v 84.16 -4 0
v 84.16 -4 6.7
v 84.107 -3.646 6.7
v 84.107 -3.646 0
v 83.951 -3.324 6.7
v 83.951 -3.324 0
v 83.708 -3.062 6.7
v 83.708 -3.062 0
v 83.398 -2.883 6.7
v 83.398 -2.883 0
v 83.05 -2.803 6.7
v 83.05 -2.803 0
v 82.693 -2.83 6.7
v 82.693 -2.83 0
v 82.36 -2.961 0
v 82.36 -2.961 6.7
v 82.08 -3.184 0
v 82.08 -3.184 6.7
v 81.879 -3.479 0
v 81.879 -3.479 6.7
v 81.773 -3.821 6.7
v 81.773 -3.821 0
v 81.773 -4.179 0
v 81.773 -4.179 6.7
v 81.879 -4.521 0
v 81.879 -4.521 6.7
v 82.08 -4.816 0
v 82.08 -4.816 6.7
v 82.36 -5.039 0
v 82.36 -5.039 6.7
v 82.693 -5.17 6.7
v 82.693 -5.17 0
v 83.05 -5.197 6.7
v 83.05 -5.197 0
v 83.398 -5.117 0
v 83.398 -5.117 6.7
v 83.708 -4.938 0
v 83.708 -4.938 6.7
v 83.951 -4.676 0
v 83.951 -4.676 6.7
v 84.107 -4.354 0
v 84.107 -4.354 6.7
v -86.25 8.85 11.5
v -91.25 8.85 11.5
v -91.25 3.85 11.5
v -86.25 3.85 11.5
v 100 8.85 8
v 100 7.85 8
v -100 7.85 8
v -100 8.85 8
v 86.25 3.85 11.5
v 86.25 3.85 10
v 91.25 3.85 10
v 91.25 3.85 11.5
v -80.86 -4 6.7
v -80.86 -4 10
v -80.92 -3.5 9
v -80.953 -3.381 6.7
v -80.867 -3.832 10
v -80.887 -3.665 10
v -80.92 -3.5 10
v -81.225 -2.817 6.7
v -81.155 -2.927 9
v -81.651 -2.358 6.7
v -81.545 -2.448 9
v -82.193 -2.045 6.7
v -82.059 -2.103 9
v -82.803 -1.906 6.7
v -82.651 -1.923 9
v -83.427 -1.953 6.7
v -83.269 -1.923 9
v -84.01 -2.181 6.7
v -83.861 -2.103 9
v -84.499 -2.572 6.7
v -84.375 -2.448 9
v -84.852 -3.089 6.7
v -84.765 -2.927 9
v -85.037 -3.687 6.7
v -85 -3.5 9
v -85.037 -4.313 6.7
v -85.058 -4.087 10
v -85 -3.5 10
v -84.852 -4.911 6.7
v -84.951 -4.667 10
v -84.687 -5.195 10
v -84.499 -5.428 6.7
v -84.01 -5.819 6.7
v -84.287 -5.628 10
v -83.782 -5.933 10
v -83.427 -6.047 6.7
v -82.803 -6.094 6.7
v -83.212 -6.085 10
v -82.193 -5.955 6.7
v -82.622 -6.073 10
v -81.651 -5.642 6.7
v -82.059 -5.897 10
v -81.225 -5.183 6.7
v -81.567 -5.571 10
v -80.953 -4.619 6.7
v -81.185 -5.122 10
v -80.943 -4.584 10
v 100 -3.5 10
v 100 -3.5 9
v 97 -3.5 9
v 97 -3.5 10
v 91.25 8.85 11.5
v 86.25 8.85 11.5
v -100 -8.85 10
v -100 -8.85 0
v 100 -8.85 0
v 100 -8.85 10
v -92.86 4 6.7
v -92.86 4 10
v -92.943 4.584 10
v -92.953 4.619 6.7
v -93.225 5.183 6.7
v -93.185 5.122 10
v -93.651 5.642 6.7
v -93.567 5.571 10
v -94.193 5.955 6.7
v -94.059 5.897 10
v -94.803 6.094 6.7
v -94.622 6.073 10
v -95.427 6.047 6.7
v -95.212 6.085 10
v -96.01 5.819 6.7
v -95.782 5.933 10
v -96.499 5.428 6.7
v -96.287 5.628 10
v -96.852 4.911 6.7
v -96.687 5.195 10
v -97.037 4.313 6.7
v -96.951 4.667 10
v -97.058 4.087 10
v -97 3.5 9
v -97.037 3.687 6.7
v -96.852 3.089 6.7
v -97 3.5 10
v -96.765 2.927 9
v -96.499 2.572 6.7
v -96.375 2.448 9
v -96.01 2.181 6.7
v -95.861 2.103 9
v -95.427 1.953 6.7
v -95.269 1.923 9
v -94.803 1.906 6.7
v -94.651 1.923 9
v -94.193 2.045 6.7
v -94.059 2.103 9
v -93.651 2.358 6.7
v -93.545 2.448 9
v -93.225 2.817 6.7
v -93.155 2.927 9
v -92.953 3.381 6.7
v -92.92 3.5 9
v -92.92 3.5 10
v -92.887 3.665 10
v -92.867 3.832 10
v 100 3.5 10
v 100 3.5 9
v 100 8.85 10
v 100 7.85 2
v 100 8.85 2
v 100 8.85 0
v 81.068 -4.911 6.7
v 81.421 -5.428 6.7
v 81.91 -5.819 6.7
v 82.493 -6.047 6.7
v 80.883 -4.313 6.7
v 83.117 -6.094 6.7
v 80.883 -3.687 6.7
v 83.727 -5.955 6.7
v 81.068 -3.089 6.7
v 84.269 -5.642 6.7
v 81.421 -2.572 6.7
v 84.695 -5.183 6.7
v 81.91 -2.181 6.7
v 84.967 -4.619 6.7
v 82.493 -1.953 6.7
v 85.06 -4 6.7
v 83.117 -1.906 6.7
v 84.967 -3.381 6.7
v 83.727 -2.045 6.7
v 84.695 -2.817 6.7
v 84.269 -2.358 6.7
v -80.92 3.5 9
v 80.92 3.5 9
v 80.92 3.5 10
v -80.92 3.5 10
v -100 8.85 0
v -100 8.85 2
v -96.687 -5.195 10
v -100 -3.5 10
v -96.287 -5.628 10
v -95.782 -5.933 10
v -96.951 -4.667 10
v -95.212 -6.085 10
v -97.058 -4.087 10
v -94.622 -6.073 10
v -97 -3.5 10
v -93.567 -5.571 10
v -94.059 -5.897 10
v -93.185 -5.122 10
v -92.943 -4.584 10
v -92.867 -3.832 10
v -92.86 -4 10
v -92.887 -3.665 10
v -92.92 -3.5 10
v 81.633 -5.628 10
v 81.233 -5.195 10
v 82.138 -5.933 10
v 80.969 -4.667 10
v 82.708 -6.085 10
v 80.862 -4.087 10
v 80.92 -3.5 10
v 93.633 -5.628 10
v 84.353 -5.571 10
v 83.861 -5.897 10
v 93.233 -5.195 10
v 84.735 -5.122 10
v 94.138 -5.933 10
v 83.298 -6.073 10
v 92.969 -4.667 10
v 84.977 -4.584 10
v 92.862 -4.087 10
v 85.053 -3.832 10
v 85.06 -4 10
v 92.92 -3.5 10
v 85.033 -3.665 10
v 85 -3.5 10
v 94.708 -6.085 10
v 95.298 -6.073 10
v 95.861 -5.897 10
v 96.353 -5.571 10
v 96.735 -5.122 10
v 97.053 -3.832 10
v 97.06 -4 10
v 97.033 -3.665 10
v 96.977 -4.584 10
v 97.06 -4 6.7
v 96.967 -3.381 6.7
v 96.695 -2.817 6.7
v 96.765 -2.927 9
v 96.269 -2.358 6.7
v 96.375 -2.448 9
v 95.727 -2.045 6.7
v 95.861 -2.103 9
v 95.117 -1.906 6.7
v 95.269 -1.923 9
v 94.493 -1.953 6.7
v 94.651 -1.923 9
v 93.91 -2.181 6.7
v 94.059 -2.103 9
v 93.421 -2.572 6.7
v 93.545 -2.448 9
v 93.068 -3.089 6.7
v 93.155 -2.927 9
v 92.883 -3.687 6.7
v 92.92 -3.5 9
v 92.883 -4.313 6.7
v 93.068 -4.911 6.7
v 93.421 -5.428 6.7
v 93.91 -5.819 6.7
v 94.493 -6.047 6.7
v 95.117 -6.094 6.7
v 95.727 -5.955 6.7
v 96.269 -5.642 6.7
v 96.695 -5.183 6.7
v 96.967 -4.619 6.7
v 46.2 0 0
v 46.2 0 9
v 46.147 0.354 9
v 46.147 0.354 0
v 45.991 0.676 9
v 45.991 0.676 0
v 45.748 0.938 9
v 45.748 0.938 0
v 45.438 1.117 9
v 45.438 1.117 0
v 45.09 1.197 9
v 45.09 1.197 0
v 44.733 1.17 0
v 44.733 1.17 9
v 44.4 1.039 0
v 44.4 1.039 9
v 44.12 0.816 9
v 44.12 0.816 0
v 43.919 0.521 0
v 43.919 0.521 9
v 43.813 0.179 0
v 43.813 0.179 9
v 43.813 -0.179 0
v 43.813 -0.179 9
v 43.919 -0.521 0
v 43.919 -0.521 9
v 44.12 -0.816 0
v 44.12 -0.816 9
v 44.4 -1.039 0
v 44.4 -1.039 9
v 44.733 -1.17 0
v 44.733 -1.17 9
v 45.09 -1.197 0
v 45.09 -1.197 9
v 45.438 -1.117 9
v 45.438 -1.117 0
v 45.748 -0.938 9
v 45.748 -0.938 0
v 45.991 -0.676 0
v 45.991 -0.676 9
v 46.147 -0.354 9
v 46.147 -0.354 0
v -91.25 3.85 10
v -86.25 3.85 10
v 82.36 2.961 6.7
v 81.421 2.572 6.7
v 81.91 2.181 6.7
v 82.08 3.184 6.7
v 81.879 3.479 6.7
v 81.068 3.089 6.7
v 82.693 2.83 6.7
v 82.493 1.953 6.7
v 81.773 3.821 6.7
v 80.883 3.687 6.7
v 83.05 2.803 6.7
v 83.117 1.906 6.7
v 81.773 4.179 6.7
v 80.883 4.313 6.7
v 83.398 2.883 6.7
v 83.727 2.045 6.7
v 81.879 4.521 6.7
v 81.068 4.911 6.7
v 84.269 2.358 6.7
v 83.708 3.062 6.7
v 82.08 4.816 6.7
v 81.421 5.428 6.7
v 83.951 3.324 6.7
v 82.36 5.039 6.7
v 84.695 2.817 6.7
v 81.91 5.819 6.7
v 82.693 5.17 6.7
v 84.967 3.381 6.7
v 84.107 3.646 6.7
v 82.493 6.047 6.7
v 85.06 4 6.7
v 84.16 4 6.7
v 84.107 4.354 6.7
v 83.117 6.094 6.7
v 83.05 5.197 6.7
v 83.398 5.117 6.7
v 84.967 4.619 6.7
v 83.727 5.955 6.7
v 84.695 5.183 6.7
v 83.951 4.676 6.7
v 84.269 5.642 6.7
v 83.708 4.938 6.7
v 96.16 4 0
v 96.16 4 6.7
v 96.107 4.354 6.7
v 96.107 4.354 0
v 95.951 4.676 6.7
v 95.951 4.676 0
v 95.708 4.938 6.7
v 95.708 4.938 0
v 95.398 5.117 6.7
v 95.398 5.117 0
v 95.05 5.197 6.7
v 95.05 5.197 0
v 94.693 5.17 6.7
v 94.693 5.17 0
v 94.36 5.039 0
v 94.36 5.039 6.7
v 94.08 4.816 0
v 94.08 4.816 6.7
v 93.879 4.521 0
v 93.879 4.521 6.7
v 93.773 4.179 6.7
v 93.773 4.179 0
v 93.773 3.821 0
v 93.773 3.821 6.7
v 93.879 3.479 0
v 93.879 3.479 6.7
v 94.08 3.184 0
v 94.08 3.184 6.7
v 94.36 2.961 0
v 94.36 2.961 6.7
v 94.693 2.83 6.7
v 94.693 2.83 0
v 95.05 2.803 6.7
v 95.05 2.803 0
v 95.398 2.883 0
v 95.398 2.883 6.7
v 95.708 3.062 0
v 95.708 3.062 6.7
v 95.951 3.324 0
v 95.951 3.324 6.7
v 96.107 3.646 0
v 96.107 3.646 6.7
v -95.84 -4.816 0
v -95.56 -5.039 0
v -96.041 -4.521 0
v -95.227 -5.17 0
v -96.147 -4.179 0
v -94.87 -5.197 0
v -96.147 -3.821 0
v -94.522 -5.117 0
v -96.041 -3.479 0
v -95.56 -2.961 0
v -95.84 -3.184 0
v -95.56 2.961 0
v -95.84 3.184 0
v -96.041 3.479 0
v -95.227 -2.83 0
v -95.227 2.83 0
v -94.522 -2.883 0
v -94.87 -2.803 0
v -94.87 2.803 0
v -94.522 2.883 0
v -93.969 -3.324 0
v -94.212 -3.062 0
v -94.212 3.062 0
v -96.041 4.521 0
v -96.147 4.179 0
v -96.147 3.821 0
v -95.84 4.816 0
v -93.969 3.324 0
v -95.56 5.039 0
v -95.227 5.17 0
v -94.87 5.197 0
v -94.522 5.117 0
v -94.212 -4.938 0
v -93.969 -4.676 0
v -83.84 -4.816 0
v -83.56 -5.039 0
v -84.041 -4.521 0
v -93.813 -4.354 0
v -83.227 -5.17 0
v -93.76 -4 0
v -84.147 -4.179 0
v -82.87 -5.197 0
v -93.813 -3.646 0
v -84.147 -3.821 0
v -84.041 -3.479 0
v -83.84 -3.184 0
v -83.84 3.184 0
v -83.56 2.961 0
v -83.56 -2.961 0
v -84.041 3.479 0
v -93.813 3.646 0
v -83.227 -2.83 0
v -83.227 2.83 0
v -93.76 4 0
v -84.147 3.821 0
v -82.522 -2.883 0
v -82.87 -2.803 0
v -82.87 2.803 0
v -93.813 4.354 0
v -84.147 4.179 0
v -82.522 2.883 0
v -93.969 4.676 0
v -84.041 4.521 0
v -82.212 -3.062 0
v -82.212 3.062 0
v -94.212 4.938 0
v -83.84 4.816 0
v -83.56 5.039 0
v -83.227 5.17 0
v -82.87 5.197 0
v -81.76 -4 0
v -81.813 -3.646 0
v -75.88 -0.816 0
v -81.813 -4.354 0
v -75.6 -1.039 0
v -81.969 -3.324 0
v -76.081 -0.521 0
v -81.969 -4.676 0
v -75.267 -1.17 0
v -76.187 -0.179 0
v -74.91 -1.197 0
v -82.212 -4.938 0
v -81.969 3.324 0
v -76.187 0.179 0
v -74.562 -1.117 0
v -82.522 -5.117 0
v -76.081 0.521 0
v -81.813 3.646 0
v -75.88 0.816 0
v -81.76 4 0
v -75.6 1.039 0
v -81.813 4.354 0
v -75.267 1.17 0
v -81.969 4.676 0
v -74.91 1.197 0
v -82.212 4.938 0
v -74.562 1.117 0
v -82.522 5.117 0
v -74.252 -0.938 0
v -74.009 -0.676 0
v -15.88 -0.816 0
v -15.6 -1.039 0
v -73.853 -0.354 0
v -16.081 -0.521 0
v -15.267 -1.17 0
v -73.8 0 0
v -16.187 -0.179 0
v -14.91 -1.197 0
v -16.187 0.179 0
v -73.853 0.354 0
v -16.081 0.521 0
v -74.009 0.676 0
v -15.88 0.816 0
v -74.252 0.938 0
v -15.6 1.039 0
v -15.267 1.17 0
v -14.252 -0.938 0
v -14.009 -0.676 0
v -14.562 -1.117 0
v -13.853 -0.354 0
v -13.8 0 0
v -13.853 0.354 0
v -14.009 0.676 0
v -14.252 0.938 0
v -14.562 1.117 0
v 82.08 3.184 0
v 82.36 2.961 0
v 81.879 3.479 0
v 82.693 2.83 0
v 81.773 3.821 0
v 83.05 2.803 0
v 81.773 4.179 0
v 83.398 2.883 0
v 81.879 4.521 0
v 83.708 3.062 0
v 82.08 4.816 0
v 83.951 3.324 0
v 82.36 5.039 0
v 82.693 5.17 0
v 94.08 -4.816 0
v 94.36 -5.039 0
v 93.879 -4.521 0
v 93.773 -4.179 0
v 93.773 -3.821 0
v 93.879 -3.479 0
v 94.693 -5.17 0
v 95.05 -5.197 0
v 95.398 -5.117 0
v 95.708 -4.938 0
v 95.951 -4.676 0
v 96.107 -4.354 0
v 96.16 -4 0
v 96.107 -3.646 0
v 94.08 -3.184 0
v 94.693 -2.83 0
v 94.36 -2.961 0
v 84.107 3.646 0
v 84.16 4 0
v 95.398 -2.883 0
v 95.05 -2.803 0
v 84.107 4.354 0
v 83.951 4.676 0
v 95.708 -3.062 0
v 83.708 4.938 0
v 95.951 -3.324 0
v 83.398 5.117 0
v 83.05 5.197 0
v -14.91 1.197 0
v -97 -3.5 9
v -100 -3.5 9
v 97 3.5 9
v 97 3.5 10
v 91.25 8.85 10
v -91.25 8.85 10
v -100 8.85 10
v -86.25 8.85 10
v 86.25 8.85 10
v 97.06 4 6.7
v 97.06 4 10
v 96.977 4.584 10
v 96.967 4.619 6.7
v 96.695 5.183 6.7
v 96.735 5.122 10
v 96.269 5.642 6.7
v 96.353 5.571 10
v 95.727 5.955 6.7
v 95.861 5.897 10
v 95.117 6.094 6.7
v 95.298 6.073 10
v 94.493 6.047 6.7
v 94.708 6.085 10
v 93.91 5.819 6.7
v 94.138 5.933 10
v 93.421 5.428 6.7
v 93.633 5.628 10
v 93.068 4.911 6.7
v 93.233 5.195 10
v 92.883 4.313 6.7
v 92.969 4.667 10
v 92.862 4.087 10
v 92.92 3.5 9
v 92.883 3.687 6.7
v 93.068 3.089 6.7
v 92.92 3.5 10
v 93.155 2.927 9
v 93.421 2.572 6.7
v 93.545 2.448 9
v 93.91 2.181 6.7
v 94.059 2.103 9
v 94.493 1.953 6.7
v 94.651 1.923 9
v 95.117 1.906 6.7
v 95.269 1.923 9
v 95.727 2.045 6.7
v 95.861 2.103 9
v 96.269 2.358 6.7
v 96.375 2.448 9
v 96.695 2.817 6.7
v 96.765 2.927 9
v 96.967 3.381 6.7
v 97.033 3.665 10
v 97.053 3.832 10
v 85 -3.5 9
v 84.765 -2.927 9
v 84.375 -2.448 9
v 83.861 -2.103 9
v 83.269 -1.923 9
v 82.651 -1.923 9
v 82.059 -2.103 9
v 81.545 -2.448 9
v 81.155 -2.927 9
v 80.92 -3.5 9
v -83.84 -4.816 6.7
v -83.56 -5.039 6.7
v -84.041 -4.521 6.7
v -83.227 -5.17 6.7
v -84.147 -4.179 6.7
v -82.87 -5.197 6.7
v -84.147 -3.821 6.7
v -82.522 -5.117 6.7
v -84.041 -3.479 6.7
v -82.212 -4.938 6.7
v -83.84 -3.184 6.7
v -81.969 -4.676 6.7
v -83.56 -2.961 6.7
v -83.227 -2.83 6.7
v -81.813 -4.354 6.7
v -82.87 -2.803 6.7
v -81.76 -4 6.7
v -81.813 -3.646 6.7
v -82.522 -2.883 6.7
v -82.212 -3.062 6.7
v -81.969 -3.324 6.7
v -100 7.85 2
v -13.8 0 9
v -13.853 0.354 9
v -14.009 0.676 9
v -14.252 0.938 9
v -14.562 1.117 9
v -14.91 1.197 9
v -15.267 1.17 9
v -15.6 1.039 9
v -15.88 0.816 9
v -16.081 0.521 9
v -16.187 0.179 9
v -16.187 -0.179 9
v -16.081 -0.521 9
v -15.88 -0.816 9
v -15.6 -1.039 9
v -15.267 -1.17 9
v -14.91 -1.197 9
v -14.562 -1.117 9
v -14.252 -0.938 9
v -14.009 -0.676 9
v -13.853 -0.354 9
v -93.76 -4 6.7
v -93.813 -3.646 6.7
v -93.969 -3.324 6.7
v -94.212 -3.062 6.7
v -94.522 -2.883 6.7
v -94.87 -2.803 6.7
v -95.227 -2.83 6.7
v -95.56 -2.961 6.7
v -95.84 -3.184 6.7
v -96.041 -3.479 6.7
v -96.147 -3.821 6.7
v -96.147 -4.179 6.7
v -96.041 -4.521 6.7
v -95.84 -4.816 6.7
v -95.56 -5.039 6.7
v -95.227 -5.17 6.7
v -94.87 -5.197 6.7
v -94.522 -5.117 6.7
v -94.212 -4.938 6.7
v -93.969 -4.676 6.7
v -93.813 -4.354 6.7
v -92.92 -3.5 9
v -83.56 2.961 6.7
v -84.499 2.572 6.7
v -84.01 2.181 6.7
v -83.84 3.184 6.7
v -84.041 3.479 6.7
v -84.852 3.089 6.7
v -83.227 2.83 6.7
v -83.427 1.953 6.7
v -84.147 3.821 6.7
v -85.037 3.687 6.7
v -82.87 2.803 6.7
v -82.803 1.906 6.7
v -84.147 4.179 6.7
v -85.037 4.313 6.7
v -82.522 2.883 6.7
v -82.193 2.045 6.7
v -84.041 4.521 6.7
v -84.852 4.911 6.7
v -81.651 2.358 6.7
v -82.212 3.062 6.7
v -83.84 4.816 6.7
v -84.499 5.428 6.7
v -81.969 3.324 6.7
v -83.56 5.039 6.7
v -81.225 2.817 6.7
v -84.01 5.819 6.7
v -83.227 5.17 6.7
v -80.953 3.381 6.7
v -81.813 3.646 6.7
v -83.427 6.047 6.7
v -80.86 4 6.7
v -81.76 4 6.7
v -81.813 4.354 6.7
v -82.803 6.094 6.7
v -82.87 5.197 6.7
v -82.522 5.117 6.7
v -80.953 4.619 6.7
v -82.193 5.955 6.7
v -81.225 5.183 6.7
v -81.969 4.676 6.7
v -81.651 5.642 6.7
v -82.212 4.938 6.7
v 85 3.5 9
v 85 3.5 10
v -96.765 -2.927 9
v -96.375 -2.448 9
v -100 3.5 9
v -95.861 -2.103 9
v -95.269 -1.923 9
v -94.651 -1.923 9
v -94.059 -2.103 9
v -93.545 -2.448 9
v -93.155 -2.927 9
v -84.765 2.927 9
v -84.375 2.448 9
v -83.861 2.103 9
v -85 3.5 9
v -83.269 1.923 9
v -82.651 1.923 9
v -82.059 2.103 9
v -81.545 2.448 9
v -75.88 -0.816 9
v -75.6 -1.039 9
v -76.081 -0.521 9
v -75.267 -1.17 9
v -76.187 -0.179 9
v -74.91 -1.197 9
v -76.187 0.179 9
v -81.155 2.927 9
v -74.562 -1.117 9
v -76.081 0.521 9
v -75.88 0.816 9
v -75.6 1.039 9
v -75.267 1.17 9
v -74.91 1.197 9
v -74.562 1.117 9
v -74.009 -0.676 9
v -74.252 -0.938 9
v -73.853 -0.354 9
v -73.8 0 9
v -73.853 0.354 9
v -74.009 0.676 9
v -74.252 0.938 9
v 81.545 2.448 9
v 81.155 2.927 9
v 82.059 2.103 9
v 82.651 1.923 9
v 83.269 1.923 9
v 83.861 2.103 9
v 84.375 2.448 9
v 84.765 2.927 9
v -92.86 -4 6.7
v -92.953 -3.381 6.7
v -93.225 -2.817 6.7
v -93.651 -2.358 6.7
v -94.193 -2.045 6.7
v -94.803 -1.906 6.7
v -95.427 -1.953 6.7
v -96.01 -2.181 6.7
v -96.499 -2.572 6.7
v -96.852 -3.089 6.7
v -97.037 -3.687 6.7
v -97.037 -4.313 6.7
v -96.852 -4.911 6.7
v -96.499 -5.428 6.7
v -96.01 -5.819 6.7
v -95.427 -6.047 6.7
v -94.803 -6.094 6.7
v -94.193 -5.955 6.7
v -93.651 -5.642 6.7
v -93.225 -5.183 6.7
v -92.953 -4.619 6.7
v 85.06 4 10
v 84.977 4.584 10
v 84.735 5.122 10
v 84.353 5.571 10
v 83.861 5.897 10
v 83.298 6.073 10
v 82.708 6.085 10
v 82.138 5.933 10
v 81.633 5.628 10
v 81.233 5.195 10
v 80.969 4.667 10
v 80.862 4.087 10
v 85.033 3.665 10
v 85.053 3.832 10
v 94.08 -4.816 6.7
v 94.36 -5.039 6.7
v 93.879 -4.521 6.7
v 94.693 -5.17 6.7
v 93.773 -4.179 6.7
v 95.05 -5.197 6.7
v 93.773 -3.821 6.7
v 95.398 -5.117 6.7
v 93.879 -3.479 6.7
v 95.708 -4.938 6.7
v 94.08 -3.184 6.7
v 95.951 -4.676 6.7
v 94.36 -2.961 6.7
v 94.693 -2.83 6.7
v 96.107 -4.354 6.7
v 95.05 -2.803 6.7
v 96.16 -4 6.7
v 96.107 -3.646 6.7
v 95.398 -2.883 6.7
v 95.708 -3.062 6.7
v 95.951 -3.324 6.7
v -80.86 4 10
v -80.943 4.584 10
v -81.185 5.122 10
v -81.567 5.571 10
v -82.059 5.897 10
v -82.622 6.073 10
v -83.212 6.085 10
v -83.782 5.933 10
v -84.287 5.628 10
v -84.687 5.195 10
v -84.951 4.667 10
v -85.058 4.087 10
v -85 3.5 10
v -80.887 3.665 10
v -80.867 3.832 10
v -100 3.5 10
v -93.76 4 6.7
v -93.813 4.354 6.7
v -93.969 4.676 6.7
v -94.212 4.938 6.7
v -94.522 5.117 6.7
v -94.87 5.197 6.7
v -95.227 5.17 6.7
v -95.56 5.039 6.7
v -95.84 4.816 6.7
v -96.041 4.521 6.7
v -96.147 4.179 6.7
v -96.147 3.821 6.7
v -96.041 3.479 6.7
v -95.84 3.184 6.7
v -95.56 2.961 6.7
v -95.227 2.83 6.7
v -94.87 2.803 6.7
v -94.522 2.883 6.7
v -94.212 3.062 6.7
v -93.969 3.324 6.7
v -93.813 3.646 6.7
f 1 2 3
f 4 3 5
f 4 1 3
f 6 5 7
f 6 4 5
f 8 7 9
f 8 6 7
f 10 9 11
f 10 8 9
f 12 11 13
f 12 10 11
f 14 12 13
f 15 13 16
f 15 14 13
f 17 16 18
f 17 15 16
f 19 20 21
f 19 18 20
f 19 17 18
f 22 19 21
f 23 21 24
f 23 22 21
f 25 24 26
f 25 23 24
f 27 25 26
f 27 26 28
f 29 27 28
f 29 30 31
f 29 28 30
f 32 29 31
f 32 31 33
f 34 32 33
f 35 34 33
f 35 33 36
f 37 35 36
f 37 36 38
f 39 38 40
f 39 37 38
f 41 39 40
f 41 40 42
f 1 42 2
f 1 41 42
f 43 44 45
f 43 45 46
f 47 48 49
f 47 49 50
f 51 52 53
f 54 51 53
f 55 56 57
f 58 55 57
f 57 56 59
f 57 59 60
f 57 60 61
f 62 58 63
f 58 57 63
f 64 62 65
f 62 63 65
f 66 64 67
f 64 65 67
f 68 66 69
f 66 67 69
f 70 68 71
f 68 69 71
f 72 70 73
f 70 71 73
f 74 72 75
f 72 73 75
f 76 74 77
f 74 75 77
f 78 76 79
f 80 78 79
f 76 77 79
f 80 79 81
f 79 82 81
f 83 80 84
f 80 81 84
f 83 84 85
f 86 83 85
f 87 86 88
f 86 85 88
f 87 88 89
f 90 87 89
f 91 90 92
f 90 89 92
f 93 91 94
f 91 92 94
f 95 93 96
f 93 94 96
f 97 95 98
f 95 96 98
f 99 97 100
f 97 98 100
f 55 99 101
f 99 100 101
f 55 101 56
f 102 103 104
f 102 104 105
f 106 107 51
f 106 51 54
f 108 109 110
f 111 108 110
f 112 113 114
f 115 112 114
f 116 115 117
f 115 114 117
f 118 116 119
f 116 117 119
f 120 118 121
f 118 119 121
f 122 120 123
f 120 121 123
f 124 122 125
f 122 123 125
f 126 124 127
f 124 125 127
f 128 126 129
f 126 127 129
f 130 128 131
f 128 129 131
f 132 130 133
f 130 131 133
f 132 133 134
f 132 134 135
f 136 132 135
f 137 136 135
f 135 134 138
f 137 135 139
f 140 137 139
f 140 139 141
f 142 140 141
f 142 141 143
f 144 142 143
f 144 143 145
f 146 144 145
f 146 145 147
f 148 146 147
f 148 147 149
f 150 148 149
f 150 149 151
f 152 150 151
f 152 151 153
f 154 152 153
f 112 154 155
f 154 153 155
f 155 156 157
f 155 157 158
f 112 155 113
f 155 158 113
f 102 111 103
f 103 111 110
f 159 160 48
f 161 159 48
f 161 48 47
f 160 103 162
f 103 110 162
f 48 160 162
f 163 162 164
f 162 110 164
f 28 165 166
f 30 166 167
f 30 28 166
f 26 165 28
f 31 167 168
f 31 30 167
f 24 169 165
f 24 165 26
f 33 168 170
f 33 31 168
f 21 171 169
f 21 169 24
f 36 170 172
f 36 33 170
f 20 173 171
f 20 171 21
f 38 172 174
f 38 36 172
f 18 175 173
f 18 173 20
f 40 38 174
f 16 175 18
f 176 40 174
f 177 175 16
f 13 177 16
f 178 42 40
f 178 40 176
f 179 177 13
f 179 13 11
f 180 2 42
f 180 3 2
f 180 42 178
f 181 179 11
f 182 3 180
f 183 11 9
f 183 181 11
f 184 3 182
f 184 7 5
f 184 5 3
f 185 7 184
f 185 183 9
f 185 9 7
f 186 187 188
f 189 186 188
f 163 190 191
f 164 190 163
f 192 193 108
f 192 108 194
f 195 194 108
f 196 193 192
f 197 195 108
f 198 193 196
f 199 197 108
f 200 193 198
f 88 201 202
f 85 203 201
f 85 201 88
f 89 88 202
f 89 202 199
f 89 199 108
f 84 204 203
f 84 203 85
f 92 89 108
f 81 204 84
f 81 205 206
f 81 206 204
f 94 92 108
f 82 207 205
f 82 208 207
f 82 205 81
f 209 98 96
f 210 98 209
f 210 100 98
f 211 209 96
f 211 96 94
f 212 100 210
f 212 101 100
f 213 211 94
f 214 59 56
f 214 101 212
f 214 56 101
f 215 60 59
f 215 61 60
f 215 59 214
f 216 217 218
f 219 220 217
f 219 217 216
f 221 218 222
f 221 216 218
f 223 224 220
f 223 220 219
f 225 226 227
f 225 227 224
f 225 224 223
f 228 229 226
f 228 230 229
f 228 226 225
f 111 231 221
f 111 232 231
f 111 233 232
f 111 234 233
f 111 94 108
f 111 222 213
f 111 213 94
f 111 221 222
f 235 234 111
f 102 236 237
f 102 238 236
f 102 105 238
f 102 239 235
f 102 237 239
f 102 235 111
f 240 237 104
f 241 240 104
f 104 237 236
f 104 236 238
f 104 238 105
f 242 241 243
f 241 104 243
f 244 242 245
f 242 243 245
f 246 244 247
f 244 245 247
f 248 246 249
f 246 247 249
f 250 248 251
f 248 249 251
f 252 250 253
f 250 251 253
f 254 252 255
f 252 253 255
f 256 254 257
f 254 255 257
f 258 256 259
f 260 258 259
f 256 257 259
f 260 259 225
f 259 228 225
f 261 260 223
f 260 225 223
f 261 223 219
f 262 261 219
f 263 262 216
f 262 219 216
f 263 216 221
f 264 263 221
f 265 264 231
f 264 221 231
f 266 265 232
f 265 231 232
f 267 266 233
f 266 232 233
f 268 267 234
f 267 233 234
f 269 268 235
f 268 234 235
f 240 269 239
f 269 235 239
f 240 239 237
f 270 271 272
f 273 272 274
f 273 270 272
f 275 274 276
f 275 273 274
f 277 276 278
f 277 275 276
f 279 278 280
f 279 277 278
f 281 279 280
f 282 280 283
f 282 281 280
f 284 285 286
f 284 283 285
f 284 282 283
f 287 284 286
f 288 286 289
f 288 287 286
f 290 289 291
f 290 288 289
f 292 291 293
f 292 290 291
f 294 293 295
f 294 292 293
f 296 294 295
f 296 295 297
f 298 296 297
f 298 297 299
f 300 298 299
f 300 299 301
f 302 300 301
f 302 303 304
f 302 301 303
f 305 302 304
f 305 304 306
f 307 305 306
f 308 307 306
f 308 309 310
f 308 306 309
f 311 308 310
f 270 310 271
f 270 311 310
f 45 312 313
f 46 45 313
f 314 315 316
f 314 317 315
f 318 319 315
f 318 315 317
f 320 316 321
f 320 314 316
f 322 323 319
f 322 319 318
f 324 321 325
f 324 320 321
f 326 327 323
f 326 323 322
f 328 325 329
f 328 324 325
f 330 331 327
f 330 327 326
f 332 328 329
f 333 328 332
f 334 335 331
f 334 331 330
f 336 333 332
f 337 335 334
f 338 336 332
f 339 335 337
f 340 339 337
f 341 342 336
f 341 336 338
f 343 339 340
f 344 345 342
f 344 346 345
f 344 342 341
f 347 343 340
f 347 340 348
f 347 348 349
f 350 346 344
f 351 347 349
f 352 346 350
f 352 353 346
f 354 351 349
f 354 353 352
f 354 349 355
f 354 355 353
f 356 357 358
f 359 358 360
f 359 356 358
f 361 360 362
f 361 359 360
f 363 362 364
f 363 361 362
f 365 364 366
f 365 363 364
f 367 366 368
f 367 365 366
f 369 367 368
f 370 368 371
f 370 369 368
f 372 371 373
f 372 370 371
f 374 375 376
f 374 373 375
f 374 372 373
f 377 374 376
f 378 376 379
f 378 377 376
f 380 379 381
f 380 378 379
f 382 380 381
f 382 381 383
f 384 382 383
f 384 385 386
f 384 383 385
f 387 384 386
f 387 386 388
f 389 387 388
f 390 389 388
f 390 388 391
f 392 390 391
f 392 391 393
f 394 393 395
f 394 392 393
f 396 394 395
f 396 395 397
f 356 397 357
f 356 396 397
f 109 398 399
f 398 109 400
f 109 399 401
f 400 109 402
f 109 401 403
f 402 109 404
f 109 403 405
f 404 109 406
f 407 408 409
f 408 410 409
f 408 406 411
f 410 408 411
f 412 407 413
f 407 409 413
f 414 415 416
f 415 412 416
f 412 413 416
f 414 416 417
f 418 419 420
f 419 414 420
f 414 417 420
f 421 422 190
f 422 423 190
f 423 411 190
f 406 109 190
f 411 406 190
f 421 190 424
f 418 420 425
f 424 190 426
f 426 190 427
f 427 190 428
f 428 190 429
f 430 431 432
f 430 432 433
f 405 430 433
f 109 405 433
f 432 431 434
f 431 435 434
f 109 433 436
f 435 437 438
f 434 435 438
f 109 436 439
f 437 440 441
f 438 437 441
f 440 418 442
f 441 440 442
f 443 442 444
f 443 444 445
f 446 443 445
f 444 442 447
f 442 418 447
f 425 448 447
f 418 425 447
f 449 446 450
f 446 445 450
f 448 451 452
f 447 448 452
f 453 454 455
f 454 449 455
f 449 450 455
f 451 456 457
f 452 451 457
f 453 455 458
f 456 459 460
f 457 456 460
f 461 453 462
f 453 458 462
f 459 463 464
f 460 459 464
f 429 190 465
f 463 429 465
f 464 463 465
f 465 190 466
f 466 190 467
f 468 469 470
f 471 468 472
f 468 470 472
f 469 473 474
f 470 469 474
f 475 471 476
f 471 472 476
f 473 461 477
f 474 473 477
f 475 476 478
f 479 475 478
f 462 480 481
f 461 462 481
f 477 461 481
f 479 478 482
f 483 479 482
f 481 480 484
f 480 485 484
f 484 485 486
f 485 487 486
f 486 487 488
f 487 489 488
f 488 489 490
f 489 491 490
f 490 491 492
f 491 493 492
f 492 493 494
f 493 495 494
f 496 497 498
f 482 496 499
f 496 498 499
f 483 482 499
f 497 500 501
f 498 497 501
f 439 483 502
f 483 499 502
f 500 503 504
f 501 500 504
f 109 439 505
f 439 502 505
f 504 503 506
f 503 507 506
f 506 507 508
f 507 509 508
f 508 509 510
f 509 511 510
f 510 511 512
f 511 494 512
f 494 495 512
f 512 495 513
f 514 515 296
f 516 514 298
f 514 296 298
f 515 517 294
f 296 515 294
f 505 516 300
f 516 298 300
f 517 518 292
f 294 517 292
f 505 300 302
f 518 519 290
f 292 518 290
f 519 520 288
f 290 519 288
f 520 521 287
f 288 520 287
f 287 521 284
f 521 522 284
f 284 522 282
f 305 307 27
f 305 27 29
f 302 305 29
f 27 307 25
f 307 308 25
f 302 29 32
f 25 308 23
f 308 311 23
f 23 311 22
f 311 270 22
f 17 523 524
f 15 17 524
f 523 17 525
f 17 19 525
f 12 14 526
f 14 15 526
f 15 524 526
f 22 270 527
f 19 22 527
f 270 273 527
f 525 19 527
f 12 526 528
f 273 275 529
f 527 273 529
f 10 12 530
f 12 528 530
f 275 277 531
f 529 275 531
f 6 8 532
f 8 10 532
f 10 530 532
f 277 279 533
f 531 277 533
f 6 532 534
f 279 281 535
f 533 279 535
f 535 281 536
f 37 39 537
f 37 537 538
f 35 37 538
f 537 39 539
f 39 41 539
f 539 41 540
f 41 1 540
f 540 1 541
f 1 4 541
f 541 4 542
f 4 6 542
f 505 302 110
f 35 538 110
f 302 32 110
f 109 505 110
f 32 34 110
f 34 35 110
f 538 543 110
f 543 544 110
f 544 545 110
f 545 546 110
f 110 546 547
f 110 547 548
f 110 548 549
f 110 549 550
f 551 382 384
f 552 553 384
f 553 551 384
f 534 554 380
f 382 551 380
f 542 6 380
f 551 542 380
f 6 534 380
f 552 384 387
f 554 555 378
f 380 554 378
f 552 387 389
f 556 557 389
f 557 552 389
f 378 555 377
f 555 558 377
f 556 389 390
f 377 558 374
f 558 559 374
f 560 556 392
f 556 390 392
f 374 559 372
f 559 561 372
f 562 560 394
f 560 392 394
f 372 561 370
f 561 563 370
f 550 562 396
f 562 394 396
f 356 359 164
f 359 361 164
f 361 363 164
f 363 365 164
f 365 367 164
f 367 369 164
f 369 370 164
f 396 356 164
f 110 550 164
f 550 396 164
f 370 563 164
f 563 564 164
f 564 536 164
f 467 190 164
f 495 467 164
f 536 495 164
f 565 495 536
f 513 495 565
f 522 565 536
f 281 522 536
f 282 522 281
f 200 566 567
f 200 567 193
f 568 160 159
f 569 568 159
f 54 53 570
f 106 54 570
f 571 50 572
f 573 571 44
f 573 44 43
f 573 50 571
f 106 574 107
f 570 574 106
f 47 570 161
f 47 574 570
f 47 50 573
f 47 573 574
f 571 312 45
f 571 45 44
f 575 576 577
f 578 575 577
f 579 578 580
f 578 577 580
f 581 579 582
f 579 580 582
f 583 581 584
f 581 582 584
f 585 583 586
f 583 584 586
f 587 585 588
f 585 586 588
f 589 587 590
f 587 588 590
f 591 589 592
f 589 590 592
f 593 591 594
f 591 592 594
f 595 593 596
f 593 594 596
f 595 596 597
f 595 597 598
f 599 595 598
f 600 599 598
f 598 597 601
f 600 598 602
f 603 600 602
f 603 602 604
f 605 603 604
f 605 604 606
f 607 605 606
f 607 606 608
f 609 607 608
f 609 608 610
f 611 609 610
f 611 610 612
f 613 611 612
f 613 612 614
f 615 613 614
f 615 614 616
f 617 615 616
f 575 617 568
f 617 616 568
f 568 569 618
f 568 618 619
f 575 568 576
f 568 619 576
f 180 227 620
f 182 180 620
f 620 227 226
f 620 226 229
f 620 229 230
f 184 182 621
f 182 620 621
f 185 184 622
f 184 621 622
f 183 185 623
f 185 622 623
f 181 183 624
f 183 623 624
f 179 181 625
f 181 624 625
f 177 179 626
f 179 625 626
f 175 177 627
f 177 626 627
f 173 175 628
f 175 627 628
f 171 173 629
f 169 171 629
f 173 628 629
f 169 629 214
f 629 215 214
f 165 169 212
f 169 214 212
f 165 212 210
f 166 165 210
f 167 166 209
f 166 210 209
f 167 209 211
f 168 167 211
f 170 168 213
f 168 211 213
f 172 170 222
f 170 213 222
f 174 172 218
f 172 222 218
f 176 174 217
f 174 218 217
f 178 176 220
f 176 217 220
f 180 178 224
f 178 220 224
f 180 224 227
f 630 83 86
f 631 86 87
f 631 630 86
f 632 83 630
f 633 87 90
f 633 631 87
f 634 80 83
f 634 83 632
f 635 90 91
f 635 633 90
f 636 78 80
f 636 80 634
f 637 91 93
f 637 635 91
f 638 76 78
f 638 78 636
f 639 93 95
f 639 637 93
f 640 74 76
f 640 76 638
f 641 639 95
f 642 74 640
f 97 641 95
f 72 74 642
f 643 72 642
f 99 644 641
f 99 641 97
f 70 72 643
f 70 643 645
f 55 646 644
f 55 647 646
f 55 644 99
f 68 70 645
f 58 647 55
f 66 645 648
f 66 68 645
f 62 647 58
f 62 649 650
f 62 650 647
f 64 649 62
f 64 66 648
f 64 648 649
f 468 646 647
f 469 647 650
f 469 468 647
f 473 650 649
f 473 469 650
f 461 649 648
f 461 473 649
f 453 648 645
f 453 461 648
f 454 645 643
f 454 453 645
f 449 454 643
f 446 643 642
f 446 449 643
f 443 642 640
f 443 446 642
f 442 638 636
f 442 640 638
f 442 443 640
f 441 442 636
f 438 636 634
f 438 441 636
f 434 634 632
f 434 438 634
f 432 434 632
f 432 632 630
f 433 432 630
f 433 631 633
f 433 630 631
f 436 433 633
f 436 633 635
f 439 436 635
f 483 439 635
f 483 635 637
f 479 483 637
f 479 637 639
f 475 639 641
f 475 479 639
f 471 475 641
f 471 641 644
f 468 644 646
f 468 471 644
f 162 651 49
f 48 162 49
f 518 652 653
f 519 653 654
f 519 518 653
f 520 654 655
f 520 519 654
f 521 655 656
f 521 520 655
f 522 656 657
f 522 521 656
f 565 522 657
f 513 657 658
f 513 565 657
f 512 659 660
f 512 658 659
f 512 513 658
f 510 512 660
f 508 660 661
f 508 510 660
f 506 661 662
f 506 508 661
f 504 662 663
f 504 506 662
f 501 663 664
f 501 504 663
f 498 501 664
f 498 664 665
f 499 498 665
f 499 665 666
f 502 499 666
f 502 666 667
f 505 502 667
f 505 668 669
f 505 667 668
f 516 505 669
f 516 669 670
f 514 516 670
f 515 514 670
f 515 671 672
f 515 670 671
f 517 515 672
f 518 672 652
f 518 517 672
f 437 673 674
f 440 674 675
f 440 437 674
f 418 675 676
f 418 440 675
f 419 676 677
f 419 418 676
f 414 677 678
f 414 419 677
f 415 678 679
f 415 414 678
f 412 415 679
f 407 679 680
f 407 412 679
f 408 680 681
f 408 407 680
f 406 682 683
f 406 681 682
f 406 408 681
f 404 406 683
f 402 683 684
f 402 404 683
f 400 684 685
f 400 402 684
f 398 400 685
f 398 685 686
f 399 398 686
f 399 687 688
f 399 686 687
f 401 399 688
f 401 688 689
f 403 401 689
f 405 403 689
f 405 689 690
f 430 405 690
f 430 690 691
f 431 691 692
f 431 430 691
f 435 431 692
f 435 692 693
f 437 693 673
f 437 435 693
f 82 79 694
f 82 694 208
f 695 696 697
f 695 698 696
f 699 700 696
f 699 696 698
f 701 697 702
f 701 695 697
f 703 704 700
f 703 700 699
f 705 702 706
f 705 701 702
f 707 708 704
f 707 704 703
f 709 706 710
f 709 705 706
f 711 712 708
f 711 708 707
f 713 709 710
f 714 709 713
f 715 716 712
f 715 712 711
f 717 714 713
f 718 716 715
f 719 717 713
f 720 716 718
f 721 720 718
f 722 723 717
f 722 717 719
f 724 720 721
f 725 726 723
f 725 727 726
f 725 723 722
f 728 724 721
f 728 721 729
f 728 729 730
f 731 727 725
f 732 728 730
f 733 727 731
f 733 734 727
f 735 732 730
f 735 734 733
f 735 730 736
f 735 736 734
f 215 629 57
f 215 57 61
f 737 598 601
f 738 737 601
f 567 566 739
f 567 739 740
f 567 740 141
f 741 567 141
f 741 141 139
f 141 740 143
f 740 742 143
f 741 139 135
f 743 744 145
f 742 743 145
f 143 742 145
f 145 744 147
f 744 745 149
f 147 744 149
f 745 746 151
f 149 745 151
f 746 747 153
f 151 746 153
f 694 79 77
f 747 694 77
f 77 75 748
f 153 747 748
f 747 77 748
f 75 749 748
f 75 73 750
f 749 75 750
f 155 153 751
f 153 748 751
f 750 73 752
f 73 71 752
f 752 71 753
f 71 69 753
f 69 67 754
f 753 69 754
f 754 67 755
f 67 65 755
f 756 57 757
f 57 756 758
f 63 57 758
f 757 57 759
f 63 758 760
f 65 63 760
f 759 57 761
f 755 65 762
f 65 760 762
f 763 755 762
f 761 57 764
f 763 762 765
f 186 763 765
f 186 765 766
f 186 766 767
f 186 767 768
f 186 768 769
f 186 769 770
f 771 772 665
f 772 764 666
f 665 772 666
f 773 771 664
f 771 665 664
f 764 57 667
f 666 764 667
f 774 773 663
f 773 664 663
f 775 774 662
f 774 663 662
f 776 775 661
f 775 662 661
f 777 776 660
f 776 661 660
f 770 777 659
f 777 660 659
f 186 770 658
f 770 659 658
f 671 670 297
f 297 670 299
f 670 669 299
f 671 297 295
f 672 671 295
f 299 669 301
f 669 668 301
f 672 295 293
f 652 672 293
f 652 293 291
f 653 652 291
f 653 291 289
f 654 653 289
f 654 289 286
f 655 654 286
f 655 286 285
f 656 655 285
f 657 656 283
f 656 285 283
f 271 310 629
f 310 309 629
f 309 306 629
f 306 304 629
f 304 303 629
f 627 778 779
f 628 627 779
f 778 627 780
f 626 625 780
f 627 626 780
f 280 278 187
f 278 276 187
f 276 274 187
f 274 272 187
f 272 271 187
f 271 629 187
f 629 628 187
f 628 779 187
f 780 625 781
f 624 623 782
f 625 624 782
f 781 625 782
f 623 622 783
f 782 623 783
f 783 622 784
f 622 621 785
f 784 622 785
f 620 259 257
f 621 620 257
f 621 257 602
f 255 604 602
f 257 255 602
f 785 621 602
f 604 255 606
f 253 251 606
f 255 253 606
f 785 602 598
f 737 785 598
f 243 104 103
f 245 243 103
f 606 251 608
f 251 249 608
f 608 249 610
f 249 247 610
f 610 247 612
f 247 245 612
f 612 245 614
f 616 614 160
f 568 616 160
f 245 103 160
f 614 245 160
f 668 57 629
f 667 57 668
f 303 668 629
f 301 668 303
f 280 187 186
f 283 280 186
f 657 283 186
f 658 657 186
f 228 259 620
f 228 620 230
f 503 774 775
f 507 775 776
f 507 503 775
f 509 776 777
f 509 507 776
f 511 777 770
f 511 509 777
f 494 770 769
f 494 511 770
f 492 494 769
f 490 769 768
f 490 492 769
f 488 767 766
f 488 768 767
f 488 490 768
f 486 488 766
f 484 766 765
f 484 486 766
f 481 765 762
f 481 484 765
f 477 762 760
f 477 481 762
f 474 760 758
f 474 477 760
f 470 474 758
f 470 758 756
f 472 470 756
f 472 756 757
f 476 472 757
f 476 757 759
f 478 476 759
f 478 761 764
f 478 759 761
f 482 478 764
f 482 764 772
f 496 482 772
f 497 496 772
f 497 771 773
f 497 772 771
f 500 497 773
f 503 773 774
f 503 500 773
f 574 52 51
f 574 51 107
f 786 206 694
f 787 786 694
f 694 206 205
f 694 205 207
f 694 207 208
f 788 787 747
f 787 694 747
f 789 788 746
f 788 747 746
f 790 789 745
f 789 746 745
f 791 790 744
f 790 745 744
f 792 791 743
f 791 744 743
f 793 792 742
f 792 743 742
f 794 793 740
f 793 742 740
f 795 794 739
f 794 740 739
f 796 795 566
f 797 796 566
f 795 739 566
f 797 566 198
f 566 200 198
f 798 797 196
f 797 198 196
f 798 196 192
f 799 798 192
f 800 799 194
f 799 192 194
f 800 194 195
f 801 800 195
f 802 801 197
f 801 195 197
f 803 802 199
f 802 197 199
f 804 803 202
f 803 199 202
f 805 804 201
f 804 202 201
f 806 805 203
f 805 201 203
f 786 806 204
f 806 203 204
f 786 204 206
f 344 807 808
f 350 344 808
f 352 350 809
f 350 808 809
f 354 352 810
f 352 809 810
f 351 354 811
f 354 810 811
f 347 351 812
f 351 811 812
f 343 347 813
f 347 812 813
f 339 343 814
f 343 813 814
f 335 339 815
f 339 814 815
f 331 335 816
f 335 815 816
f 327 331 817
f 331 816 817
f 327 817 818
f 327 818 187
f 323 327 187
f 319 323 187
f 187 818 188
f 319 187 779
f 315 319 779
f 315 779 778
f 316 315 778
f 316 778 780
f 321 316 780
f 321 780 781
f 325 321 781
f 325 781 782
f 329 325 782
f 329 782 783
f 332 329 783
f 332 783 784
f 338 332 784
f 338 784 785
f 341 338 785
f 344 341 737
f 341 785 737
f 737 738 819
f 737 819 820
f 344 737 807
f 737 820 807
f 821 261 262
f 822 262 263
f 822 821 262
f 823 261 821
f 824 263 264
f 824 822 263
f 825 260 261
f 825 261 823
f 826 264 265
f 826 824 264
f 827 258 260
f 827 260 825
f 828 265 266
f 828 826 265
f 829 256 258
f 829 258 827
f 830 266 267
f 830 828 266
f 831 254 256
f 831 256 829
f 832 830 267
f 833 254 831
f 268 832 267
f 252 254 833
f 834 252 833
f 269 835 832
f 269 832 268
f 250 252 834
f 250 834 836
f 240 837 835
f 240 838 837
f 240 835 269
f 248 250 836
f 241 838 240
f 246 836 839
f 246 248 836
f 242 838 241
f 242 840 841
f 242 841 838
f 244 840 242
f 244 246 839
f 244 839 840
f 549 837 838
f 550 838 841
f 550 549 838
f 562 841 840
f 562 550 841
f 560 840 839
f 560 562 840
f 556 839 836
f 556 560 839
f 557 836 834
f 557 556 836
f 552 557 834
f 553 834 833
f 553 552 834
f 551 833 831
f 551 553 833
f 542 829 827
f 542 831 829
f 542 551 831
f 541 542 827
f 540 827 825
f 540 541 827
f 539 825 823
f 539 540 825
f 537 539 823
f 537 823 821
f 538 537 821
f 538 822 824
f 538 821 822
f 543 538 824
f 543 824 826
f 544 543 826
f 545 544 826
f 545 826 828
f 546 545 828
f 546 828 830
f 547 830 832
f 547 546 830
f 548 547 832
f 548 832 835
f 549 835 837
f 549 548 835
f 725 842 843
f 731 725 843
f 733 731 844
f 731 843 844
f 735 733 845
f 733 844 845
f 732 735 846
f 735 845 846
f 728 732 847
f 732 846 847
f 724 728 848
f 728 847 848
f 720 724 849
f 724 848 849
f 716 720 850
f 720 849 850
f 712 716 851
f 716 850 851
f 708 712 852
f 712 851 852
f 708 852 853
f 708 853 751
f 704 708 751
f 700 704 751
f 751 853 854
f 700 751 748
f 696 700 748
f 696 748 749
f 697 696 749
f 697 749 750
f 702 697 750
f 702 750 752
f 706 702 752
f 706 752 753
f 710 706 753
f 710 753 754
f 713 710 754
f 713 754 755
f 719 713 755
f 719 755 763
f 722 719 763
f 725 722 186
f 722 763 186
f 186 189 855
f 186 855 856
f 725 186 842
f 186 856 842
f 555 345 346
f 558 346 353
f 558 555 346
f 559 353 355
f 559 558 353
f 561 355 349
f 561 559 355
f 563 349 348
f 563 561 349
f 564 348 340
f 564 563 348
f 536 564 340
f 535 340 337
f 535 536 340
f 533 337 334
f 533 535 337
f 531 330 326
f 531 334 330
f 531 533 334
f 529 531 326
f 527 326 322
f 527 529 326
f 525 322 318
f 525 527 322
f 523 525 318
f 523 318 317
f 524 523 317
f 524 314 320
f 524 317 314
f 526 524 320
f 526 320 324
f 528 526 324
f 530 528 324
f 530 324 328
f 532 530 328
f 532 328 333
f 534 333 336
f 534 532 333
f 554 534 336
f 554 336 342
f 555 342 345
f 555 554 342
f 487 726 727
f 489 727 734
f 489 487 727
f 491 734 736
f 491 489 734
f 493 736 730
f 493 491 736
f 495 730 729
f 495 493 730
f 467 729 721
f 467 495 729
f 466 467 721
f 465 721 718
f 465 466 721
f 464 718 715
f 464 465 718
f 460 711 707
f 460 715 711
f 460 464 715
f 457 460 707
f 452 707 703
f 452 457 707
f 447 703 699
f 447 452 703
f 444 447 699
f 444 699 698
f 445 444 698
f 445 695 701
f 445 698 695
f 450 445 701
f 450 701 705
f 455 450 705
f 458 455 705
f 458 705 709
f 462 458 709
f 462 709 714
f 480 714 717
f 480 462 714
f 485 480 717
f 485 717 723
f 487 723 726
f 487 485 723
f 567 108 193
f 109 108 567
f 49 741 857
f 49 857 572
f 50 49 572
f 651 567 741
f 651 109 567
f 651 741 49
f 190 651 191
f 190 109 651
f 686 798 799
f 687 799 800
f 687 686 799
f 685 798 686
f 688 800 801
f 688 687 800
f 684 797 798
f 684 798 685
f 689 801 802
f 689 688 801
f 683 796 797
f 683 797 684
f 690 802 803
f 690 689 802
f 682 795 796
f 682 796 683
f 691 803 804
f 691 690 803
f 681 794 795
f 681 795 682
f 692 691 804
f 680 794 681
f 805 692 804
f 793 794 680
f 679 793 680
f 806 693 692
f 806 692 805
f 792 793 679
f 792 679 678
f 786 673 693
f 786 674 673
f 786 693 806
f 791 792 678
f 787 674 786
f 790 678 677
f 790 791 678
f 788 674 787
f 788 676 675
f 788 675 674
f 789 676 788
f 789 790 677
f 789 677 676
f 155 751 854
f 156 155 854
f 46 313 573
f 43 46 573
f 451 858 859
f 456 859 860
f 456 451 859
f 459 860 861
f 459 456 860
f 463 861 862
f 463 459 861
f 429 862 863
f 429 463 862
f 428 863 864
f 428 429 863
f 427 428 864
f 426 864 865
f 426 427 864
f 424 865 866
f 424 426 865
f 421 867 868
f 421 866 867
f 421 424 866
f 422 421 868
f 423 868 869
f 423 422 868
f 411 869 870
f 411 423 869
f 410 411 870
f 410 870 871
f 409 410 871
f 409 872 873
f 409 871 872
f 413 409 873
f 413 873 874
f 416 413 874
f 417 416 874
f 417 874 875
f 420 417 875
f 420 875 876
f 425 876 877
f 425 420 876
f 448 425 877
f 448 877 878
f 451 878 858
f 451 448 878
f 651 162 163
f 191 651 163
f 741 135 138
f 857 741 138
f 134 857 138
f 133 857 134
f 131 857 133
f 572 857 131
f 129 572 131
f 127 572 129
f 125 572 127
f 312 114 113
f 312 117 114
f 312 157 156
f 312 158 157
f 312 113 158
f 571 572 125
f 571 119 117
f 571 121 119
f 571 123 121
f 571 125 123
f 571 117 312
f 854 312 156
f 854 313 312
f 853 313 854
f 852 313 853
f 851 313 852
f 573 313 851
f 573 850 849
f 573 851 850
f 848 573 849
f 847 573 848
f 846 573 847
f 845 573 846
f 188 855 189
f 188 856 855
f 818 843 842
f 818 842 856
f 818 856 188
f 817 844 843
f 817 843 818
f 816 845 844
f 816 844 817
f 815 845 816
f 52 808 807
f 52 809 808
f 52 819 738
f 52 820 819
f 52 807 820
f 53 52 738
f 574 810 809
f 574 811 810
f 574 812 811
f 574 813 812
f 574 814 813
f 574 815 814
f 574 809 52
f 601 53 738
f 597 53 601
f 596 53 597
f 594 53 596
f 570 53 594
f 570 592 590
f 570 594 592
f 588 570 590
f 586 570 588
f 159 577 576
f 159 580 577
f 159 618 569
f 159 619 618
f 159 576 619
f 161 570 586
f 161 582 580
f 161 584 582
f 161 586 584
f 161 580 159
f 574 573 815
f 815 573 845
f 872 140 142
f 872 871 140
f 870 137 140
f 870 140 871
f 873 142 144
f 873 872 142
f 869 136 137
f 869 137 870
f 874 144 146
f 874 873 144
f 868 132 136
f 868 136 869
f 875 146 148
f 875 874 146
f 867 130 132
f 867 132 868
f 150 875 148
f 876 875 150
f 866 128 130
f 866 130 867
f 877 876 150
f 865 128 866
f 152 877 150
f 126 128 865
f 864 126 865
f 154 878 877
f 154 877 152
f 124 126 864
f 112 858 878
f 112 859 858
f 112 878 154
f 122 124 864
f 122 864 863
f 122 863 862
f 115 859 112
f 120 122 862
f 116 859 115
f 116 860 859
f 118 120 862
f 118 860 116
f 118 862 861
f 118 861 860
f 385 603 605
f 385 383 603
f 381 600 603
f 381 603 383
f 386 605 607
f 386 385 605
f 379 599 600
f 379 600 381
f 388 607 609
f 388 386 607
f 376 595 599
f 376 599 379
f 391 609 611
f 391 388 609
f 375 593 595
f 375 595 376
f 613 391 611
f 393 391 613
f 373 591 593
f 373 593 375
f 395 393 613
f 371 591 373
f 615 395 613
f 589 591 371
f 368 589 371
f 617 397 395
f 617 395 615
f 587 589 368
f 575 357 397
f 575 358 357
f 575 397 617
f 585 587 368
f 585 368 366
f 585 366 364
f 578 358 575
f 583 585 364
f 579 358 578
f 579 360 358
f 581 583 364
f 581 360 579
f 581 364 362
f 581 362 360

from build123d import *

# Parameters (mm, degrees)
SKETCH_W        = 200
SKETCH_H        = 17.7
SKETCH_R        = 1.2
PAD_DEPTH       = 10
SKETCH001_R     = 2.1
POCKET_DEPTH    = 3.3
SKETCH002_W     = 7
SKETCH002_H     = 1
POCKET001_DEPTH = 200
SKETCH012_W     = 5
SKETCH012_H     = 5
PAD003_DEPTH    = 1.5
SKETCH013_W     = 1
SKETCH013_H     = 6
POCKET009_DEPTH = 200


with BuildPart() as part:
    # Sketch → Pad (new body)
    with BuildSketch(Plane.XY):
        Rectangle(SKETCH_W, SKETCH_H)
        with Locations((-75, 0)):
            Circle(SKETCH_R, mode=Mode.SUBTRACT)
        with Locations((-15, 0)):
            Circle(SKETCH_R, mode=Mode.SUBTRACT)
        with Locations((45, 0)):
            Circle(SKETCH_R, mode=Mode.SUBTRACT)
        with Locations((-94.96, 4)):
            Circle(SKETCH_R, mode=Mode.SUBTRACT)
        with Locations((-82.96, 4)):
            Circle(SKETCH_R, mode=Mode.SUBTRACT)
        with Locations((-94.96, -4)):
            Circle(SKETCH_R, mode=Mode.SUBTRACT)
        with Locations((-82.96, -4)):
            Circle(SKETCH_R, mode=Mode.SUBTRACT)
        with Locations((82.96, 4)):
            Circle(SKETCH_R, mode=Mode.SUBTRACT)
        with Locations((94.96, 4)):
            Circle(SKETCH_R, mode=Mode.SUBTRACT)
        with Locations((82.96, -4)):
            Circle(SKETCH_R, mode=Mode.SUBTRACT)
        with Locations((94.96, -4)):
            Circle(SKETCH_R, mode=Mode.SUBTRACT)
    extrude(amount=PAD_DEPTH)

    # Sketch001 (on Face17 of Pad) → Pocket (cut)
    with BuildSketch(Plane.XY.offset(10)):
        with Locations((94.96, -4)):
            Circle(SKETCH001_R)
        with Locations((-94.96, 4)):
            Circle(SKETCH001_R)
        with Locations((-82.96, 4)):
            Circle(SKETCH001_R)
        with Locations((-82.96, -4)):
            Circle(SKETCH001_R)
        with Locations((94.96, 4)):
            Circle(SKETCH001_R)
        with Locations((82.96, 4)):
            Circle(SKETCH001_R)
        with Locations((-94.96, -4)):
            Circle(SKETCH001_R)
        with Locations((82.96, -4)):
            Circle(SKETCH001_R)
    extrude(amount=-POCKET_DEPTH, mode=Mode.SUBTRACT)

    # Sketch002 (on Face3 of Pocket) → Pocket001 (cut)
    with BuildSketch(Plane.YZ.offset(100)):
        with Locations((0, 9.5)):
            Rectangle(SKETCH002_W, SKETCH002_H)
    extrude(amount=-POCKET001_DEPTH, mode=Mode.SUBTRACT)

    # Sketch012 (on Face9 of Pocket001) → Pad003 (join)
    with BuildSketch(Plane.XY.offset(10)):
        with Locations((88.75, 6.35)):
            Rectangle(SKETCH012_W, SKETCH012_H)
        with Locations((-88.75, 6.35)):
            Rectangle(SKETCH012_W, SKETCH012_H)
    extrude(amount=PAD003_DEPTH)

    # Sketch013 (on Face3 of Pad003) → Pocket009 (cut)
    with BuildSketch(Plane.YZ.offset(100)):
        with Locations((8.35, 5)):
            Rectangle(SKETCH013_W, SKETCH013_H)
    extrude(amount=-POCKET009_DEPTH, mode=Mode.SUBTRACT)


solid = part.part
